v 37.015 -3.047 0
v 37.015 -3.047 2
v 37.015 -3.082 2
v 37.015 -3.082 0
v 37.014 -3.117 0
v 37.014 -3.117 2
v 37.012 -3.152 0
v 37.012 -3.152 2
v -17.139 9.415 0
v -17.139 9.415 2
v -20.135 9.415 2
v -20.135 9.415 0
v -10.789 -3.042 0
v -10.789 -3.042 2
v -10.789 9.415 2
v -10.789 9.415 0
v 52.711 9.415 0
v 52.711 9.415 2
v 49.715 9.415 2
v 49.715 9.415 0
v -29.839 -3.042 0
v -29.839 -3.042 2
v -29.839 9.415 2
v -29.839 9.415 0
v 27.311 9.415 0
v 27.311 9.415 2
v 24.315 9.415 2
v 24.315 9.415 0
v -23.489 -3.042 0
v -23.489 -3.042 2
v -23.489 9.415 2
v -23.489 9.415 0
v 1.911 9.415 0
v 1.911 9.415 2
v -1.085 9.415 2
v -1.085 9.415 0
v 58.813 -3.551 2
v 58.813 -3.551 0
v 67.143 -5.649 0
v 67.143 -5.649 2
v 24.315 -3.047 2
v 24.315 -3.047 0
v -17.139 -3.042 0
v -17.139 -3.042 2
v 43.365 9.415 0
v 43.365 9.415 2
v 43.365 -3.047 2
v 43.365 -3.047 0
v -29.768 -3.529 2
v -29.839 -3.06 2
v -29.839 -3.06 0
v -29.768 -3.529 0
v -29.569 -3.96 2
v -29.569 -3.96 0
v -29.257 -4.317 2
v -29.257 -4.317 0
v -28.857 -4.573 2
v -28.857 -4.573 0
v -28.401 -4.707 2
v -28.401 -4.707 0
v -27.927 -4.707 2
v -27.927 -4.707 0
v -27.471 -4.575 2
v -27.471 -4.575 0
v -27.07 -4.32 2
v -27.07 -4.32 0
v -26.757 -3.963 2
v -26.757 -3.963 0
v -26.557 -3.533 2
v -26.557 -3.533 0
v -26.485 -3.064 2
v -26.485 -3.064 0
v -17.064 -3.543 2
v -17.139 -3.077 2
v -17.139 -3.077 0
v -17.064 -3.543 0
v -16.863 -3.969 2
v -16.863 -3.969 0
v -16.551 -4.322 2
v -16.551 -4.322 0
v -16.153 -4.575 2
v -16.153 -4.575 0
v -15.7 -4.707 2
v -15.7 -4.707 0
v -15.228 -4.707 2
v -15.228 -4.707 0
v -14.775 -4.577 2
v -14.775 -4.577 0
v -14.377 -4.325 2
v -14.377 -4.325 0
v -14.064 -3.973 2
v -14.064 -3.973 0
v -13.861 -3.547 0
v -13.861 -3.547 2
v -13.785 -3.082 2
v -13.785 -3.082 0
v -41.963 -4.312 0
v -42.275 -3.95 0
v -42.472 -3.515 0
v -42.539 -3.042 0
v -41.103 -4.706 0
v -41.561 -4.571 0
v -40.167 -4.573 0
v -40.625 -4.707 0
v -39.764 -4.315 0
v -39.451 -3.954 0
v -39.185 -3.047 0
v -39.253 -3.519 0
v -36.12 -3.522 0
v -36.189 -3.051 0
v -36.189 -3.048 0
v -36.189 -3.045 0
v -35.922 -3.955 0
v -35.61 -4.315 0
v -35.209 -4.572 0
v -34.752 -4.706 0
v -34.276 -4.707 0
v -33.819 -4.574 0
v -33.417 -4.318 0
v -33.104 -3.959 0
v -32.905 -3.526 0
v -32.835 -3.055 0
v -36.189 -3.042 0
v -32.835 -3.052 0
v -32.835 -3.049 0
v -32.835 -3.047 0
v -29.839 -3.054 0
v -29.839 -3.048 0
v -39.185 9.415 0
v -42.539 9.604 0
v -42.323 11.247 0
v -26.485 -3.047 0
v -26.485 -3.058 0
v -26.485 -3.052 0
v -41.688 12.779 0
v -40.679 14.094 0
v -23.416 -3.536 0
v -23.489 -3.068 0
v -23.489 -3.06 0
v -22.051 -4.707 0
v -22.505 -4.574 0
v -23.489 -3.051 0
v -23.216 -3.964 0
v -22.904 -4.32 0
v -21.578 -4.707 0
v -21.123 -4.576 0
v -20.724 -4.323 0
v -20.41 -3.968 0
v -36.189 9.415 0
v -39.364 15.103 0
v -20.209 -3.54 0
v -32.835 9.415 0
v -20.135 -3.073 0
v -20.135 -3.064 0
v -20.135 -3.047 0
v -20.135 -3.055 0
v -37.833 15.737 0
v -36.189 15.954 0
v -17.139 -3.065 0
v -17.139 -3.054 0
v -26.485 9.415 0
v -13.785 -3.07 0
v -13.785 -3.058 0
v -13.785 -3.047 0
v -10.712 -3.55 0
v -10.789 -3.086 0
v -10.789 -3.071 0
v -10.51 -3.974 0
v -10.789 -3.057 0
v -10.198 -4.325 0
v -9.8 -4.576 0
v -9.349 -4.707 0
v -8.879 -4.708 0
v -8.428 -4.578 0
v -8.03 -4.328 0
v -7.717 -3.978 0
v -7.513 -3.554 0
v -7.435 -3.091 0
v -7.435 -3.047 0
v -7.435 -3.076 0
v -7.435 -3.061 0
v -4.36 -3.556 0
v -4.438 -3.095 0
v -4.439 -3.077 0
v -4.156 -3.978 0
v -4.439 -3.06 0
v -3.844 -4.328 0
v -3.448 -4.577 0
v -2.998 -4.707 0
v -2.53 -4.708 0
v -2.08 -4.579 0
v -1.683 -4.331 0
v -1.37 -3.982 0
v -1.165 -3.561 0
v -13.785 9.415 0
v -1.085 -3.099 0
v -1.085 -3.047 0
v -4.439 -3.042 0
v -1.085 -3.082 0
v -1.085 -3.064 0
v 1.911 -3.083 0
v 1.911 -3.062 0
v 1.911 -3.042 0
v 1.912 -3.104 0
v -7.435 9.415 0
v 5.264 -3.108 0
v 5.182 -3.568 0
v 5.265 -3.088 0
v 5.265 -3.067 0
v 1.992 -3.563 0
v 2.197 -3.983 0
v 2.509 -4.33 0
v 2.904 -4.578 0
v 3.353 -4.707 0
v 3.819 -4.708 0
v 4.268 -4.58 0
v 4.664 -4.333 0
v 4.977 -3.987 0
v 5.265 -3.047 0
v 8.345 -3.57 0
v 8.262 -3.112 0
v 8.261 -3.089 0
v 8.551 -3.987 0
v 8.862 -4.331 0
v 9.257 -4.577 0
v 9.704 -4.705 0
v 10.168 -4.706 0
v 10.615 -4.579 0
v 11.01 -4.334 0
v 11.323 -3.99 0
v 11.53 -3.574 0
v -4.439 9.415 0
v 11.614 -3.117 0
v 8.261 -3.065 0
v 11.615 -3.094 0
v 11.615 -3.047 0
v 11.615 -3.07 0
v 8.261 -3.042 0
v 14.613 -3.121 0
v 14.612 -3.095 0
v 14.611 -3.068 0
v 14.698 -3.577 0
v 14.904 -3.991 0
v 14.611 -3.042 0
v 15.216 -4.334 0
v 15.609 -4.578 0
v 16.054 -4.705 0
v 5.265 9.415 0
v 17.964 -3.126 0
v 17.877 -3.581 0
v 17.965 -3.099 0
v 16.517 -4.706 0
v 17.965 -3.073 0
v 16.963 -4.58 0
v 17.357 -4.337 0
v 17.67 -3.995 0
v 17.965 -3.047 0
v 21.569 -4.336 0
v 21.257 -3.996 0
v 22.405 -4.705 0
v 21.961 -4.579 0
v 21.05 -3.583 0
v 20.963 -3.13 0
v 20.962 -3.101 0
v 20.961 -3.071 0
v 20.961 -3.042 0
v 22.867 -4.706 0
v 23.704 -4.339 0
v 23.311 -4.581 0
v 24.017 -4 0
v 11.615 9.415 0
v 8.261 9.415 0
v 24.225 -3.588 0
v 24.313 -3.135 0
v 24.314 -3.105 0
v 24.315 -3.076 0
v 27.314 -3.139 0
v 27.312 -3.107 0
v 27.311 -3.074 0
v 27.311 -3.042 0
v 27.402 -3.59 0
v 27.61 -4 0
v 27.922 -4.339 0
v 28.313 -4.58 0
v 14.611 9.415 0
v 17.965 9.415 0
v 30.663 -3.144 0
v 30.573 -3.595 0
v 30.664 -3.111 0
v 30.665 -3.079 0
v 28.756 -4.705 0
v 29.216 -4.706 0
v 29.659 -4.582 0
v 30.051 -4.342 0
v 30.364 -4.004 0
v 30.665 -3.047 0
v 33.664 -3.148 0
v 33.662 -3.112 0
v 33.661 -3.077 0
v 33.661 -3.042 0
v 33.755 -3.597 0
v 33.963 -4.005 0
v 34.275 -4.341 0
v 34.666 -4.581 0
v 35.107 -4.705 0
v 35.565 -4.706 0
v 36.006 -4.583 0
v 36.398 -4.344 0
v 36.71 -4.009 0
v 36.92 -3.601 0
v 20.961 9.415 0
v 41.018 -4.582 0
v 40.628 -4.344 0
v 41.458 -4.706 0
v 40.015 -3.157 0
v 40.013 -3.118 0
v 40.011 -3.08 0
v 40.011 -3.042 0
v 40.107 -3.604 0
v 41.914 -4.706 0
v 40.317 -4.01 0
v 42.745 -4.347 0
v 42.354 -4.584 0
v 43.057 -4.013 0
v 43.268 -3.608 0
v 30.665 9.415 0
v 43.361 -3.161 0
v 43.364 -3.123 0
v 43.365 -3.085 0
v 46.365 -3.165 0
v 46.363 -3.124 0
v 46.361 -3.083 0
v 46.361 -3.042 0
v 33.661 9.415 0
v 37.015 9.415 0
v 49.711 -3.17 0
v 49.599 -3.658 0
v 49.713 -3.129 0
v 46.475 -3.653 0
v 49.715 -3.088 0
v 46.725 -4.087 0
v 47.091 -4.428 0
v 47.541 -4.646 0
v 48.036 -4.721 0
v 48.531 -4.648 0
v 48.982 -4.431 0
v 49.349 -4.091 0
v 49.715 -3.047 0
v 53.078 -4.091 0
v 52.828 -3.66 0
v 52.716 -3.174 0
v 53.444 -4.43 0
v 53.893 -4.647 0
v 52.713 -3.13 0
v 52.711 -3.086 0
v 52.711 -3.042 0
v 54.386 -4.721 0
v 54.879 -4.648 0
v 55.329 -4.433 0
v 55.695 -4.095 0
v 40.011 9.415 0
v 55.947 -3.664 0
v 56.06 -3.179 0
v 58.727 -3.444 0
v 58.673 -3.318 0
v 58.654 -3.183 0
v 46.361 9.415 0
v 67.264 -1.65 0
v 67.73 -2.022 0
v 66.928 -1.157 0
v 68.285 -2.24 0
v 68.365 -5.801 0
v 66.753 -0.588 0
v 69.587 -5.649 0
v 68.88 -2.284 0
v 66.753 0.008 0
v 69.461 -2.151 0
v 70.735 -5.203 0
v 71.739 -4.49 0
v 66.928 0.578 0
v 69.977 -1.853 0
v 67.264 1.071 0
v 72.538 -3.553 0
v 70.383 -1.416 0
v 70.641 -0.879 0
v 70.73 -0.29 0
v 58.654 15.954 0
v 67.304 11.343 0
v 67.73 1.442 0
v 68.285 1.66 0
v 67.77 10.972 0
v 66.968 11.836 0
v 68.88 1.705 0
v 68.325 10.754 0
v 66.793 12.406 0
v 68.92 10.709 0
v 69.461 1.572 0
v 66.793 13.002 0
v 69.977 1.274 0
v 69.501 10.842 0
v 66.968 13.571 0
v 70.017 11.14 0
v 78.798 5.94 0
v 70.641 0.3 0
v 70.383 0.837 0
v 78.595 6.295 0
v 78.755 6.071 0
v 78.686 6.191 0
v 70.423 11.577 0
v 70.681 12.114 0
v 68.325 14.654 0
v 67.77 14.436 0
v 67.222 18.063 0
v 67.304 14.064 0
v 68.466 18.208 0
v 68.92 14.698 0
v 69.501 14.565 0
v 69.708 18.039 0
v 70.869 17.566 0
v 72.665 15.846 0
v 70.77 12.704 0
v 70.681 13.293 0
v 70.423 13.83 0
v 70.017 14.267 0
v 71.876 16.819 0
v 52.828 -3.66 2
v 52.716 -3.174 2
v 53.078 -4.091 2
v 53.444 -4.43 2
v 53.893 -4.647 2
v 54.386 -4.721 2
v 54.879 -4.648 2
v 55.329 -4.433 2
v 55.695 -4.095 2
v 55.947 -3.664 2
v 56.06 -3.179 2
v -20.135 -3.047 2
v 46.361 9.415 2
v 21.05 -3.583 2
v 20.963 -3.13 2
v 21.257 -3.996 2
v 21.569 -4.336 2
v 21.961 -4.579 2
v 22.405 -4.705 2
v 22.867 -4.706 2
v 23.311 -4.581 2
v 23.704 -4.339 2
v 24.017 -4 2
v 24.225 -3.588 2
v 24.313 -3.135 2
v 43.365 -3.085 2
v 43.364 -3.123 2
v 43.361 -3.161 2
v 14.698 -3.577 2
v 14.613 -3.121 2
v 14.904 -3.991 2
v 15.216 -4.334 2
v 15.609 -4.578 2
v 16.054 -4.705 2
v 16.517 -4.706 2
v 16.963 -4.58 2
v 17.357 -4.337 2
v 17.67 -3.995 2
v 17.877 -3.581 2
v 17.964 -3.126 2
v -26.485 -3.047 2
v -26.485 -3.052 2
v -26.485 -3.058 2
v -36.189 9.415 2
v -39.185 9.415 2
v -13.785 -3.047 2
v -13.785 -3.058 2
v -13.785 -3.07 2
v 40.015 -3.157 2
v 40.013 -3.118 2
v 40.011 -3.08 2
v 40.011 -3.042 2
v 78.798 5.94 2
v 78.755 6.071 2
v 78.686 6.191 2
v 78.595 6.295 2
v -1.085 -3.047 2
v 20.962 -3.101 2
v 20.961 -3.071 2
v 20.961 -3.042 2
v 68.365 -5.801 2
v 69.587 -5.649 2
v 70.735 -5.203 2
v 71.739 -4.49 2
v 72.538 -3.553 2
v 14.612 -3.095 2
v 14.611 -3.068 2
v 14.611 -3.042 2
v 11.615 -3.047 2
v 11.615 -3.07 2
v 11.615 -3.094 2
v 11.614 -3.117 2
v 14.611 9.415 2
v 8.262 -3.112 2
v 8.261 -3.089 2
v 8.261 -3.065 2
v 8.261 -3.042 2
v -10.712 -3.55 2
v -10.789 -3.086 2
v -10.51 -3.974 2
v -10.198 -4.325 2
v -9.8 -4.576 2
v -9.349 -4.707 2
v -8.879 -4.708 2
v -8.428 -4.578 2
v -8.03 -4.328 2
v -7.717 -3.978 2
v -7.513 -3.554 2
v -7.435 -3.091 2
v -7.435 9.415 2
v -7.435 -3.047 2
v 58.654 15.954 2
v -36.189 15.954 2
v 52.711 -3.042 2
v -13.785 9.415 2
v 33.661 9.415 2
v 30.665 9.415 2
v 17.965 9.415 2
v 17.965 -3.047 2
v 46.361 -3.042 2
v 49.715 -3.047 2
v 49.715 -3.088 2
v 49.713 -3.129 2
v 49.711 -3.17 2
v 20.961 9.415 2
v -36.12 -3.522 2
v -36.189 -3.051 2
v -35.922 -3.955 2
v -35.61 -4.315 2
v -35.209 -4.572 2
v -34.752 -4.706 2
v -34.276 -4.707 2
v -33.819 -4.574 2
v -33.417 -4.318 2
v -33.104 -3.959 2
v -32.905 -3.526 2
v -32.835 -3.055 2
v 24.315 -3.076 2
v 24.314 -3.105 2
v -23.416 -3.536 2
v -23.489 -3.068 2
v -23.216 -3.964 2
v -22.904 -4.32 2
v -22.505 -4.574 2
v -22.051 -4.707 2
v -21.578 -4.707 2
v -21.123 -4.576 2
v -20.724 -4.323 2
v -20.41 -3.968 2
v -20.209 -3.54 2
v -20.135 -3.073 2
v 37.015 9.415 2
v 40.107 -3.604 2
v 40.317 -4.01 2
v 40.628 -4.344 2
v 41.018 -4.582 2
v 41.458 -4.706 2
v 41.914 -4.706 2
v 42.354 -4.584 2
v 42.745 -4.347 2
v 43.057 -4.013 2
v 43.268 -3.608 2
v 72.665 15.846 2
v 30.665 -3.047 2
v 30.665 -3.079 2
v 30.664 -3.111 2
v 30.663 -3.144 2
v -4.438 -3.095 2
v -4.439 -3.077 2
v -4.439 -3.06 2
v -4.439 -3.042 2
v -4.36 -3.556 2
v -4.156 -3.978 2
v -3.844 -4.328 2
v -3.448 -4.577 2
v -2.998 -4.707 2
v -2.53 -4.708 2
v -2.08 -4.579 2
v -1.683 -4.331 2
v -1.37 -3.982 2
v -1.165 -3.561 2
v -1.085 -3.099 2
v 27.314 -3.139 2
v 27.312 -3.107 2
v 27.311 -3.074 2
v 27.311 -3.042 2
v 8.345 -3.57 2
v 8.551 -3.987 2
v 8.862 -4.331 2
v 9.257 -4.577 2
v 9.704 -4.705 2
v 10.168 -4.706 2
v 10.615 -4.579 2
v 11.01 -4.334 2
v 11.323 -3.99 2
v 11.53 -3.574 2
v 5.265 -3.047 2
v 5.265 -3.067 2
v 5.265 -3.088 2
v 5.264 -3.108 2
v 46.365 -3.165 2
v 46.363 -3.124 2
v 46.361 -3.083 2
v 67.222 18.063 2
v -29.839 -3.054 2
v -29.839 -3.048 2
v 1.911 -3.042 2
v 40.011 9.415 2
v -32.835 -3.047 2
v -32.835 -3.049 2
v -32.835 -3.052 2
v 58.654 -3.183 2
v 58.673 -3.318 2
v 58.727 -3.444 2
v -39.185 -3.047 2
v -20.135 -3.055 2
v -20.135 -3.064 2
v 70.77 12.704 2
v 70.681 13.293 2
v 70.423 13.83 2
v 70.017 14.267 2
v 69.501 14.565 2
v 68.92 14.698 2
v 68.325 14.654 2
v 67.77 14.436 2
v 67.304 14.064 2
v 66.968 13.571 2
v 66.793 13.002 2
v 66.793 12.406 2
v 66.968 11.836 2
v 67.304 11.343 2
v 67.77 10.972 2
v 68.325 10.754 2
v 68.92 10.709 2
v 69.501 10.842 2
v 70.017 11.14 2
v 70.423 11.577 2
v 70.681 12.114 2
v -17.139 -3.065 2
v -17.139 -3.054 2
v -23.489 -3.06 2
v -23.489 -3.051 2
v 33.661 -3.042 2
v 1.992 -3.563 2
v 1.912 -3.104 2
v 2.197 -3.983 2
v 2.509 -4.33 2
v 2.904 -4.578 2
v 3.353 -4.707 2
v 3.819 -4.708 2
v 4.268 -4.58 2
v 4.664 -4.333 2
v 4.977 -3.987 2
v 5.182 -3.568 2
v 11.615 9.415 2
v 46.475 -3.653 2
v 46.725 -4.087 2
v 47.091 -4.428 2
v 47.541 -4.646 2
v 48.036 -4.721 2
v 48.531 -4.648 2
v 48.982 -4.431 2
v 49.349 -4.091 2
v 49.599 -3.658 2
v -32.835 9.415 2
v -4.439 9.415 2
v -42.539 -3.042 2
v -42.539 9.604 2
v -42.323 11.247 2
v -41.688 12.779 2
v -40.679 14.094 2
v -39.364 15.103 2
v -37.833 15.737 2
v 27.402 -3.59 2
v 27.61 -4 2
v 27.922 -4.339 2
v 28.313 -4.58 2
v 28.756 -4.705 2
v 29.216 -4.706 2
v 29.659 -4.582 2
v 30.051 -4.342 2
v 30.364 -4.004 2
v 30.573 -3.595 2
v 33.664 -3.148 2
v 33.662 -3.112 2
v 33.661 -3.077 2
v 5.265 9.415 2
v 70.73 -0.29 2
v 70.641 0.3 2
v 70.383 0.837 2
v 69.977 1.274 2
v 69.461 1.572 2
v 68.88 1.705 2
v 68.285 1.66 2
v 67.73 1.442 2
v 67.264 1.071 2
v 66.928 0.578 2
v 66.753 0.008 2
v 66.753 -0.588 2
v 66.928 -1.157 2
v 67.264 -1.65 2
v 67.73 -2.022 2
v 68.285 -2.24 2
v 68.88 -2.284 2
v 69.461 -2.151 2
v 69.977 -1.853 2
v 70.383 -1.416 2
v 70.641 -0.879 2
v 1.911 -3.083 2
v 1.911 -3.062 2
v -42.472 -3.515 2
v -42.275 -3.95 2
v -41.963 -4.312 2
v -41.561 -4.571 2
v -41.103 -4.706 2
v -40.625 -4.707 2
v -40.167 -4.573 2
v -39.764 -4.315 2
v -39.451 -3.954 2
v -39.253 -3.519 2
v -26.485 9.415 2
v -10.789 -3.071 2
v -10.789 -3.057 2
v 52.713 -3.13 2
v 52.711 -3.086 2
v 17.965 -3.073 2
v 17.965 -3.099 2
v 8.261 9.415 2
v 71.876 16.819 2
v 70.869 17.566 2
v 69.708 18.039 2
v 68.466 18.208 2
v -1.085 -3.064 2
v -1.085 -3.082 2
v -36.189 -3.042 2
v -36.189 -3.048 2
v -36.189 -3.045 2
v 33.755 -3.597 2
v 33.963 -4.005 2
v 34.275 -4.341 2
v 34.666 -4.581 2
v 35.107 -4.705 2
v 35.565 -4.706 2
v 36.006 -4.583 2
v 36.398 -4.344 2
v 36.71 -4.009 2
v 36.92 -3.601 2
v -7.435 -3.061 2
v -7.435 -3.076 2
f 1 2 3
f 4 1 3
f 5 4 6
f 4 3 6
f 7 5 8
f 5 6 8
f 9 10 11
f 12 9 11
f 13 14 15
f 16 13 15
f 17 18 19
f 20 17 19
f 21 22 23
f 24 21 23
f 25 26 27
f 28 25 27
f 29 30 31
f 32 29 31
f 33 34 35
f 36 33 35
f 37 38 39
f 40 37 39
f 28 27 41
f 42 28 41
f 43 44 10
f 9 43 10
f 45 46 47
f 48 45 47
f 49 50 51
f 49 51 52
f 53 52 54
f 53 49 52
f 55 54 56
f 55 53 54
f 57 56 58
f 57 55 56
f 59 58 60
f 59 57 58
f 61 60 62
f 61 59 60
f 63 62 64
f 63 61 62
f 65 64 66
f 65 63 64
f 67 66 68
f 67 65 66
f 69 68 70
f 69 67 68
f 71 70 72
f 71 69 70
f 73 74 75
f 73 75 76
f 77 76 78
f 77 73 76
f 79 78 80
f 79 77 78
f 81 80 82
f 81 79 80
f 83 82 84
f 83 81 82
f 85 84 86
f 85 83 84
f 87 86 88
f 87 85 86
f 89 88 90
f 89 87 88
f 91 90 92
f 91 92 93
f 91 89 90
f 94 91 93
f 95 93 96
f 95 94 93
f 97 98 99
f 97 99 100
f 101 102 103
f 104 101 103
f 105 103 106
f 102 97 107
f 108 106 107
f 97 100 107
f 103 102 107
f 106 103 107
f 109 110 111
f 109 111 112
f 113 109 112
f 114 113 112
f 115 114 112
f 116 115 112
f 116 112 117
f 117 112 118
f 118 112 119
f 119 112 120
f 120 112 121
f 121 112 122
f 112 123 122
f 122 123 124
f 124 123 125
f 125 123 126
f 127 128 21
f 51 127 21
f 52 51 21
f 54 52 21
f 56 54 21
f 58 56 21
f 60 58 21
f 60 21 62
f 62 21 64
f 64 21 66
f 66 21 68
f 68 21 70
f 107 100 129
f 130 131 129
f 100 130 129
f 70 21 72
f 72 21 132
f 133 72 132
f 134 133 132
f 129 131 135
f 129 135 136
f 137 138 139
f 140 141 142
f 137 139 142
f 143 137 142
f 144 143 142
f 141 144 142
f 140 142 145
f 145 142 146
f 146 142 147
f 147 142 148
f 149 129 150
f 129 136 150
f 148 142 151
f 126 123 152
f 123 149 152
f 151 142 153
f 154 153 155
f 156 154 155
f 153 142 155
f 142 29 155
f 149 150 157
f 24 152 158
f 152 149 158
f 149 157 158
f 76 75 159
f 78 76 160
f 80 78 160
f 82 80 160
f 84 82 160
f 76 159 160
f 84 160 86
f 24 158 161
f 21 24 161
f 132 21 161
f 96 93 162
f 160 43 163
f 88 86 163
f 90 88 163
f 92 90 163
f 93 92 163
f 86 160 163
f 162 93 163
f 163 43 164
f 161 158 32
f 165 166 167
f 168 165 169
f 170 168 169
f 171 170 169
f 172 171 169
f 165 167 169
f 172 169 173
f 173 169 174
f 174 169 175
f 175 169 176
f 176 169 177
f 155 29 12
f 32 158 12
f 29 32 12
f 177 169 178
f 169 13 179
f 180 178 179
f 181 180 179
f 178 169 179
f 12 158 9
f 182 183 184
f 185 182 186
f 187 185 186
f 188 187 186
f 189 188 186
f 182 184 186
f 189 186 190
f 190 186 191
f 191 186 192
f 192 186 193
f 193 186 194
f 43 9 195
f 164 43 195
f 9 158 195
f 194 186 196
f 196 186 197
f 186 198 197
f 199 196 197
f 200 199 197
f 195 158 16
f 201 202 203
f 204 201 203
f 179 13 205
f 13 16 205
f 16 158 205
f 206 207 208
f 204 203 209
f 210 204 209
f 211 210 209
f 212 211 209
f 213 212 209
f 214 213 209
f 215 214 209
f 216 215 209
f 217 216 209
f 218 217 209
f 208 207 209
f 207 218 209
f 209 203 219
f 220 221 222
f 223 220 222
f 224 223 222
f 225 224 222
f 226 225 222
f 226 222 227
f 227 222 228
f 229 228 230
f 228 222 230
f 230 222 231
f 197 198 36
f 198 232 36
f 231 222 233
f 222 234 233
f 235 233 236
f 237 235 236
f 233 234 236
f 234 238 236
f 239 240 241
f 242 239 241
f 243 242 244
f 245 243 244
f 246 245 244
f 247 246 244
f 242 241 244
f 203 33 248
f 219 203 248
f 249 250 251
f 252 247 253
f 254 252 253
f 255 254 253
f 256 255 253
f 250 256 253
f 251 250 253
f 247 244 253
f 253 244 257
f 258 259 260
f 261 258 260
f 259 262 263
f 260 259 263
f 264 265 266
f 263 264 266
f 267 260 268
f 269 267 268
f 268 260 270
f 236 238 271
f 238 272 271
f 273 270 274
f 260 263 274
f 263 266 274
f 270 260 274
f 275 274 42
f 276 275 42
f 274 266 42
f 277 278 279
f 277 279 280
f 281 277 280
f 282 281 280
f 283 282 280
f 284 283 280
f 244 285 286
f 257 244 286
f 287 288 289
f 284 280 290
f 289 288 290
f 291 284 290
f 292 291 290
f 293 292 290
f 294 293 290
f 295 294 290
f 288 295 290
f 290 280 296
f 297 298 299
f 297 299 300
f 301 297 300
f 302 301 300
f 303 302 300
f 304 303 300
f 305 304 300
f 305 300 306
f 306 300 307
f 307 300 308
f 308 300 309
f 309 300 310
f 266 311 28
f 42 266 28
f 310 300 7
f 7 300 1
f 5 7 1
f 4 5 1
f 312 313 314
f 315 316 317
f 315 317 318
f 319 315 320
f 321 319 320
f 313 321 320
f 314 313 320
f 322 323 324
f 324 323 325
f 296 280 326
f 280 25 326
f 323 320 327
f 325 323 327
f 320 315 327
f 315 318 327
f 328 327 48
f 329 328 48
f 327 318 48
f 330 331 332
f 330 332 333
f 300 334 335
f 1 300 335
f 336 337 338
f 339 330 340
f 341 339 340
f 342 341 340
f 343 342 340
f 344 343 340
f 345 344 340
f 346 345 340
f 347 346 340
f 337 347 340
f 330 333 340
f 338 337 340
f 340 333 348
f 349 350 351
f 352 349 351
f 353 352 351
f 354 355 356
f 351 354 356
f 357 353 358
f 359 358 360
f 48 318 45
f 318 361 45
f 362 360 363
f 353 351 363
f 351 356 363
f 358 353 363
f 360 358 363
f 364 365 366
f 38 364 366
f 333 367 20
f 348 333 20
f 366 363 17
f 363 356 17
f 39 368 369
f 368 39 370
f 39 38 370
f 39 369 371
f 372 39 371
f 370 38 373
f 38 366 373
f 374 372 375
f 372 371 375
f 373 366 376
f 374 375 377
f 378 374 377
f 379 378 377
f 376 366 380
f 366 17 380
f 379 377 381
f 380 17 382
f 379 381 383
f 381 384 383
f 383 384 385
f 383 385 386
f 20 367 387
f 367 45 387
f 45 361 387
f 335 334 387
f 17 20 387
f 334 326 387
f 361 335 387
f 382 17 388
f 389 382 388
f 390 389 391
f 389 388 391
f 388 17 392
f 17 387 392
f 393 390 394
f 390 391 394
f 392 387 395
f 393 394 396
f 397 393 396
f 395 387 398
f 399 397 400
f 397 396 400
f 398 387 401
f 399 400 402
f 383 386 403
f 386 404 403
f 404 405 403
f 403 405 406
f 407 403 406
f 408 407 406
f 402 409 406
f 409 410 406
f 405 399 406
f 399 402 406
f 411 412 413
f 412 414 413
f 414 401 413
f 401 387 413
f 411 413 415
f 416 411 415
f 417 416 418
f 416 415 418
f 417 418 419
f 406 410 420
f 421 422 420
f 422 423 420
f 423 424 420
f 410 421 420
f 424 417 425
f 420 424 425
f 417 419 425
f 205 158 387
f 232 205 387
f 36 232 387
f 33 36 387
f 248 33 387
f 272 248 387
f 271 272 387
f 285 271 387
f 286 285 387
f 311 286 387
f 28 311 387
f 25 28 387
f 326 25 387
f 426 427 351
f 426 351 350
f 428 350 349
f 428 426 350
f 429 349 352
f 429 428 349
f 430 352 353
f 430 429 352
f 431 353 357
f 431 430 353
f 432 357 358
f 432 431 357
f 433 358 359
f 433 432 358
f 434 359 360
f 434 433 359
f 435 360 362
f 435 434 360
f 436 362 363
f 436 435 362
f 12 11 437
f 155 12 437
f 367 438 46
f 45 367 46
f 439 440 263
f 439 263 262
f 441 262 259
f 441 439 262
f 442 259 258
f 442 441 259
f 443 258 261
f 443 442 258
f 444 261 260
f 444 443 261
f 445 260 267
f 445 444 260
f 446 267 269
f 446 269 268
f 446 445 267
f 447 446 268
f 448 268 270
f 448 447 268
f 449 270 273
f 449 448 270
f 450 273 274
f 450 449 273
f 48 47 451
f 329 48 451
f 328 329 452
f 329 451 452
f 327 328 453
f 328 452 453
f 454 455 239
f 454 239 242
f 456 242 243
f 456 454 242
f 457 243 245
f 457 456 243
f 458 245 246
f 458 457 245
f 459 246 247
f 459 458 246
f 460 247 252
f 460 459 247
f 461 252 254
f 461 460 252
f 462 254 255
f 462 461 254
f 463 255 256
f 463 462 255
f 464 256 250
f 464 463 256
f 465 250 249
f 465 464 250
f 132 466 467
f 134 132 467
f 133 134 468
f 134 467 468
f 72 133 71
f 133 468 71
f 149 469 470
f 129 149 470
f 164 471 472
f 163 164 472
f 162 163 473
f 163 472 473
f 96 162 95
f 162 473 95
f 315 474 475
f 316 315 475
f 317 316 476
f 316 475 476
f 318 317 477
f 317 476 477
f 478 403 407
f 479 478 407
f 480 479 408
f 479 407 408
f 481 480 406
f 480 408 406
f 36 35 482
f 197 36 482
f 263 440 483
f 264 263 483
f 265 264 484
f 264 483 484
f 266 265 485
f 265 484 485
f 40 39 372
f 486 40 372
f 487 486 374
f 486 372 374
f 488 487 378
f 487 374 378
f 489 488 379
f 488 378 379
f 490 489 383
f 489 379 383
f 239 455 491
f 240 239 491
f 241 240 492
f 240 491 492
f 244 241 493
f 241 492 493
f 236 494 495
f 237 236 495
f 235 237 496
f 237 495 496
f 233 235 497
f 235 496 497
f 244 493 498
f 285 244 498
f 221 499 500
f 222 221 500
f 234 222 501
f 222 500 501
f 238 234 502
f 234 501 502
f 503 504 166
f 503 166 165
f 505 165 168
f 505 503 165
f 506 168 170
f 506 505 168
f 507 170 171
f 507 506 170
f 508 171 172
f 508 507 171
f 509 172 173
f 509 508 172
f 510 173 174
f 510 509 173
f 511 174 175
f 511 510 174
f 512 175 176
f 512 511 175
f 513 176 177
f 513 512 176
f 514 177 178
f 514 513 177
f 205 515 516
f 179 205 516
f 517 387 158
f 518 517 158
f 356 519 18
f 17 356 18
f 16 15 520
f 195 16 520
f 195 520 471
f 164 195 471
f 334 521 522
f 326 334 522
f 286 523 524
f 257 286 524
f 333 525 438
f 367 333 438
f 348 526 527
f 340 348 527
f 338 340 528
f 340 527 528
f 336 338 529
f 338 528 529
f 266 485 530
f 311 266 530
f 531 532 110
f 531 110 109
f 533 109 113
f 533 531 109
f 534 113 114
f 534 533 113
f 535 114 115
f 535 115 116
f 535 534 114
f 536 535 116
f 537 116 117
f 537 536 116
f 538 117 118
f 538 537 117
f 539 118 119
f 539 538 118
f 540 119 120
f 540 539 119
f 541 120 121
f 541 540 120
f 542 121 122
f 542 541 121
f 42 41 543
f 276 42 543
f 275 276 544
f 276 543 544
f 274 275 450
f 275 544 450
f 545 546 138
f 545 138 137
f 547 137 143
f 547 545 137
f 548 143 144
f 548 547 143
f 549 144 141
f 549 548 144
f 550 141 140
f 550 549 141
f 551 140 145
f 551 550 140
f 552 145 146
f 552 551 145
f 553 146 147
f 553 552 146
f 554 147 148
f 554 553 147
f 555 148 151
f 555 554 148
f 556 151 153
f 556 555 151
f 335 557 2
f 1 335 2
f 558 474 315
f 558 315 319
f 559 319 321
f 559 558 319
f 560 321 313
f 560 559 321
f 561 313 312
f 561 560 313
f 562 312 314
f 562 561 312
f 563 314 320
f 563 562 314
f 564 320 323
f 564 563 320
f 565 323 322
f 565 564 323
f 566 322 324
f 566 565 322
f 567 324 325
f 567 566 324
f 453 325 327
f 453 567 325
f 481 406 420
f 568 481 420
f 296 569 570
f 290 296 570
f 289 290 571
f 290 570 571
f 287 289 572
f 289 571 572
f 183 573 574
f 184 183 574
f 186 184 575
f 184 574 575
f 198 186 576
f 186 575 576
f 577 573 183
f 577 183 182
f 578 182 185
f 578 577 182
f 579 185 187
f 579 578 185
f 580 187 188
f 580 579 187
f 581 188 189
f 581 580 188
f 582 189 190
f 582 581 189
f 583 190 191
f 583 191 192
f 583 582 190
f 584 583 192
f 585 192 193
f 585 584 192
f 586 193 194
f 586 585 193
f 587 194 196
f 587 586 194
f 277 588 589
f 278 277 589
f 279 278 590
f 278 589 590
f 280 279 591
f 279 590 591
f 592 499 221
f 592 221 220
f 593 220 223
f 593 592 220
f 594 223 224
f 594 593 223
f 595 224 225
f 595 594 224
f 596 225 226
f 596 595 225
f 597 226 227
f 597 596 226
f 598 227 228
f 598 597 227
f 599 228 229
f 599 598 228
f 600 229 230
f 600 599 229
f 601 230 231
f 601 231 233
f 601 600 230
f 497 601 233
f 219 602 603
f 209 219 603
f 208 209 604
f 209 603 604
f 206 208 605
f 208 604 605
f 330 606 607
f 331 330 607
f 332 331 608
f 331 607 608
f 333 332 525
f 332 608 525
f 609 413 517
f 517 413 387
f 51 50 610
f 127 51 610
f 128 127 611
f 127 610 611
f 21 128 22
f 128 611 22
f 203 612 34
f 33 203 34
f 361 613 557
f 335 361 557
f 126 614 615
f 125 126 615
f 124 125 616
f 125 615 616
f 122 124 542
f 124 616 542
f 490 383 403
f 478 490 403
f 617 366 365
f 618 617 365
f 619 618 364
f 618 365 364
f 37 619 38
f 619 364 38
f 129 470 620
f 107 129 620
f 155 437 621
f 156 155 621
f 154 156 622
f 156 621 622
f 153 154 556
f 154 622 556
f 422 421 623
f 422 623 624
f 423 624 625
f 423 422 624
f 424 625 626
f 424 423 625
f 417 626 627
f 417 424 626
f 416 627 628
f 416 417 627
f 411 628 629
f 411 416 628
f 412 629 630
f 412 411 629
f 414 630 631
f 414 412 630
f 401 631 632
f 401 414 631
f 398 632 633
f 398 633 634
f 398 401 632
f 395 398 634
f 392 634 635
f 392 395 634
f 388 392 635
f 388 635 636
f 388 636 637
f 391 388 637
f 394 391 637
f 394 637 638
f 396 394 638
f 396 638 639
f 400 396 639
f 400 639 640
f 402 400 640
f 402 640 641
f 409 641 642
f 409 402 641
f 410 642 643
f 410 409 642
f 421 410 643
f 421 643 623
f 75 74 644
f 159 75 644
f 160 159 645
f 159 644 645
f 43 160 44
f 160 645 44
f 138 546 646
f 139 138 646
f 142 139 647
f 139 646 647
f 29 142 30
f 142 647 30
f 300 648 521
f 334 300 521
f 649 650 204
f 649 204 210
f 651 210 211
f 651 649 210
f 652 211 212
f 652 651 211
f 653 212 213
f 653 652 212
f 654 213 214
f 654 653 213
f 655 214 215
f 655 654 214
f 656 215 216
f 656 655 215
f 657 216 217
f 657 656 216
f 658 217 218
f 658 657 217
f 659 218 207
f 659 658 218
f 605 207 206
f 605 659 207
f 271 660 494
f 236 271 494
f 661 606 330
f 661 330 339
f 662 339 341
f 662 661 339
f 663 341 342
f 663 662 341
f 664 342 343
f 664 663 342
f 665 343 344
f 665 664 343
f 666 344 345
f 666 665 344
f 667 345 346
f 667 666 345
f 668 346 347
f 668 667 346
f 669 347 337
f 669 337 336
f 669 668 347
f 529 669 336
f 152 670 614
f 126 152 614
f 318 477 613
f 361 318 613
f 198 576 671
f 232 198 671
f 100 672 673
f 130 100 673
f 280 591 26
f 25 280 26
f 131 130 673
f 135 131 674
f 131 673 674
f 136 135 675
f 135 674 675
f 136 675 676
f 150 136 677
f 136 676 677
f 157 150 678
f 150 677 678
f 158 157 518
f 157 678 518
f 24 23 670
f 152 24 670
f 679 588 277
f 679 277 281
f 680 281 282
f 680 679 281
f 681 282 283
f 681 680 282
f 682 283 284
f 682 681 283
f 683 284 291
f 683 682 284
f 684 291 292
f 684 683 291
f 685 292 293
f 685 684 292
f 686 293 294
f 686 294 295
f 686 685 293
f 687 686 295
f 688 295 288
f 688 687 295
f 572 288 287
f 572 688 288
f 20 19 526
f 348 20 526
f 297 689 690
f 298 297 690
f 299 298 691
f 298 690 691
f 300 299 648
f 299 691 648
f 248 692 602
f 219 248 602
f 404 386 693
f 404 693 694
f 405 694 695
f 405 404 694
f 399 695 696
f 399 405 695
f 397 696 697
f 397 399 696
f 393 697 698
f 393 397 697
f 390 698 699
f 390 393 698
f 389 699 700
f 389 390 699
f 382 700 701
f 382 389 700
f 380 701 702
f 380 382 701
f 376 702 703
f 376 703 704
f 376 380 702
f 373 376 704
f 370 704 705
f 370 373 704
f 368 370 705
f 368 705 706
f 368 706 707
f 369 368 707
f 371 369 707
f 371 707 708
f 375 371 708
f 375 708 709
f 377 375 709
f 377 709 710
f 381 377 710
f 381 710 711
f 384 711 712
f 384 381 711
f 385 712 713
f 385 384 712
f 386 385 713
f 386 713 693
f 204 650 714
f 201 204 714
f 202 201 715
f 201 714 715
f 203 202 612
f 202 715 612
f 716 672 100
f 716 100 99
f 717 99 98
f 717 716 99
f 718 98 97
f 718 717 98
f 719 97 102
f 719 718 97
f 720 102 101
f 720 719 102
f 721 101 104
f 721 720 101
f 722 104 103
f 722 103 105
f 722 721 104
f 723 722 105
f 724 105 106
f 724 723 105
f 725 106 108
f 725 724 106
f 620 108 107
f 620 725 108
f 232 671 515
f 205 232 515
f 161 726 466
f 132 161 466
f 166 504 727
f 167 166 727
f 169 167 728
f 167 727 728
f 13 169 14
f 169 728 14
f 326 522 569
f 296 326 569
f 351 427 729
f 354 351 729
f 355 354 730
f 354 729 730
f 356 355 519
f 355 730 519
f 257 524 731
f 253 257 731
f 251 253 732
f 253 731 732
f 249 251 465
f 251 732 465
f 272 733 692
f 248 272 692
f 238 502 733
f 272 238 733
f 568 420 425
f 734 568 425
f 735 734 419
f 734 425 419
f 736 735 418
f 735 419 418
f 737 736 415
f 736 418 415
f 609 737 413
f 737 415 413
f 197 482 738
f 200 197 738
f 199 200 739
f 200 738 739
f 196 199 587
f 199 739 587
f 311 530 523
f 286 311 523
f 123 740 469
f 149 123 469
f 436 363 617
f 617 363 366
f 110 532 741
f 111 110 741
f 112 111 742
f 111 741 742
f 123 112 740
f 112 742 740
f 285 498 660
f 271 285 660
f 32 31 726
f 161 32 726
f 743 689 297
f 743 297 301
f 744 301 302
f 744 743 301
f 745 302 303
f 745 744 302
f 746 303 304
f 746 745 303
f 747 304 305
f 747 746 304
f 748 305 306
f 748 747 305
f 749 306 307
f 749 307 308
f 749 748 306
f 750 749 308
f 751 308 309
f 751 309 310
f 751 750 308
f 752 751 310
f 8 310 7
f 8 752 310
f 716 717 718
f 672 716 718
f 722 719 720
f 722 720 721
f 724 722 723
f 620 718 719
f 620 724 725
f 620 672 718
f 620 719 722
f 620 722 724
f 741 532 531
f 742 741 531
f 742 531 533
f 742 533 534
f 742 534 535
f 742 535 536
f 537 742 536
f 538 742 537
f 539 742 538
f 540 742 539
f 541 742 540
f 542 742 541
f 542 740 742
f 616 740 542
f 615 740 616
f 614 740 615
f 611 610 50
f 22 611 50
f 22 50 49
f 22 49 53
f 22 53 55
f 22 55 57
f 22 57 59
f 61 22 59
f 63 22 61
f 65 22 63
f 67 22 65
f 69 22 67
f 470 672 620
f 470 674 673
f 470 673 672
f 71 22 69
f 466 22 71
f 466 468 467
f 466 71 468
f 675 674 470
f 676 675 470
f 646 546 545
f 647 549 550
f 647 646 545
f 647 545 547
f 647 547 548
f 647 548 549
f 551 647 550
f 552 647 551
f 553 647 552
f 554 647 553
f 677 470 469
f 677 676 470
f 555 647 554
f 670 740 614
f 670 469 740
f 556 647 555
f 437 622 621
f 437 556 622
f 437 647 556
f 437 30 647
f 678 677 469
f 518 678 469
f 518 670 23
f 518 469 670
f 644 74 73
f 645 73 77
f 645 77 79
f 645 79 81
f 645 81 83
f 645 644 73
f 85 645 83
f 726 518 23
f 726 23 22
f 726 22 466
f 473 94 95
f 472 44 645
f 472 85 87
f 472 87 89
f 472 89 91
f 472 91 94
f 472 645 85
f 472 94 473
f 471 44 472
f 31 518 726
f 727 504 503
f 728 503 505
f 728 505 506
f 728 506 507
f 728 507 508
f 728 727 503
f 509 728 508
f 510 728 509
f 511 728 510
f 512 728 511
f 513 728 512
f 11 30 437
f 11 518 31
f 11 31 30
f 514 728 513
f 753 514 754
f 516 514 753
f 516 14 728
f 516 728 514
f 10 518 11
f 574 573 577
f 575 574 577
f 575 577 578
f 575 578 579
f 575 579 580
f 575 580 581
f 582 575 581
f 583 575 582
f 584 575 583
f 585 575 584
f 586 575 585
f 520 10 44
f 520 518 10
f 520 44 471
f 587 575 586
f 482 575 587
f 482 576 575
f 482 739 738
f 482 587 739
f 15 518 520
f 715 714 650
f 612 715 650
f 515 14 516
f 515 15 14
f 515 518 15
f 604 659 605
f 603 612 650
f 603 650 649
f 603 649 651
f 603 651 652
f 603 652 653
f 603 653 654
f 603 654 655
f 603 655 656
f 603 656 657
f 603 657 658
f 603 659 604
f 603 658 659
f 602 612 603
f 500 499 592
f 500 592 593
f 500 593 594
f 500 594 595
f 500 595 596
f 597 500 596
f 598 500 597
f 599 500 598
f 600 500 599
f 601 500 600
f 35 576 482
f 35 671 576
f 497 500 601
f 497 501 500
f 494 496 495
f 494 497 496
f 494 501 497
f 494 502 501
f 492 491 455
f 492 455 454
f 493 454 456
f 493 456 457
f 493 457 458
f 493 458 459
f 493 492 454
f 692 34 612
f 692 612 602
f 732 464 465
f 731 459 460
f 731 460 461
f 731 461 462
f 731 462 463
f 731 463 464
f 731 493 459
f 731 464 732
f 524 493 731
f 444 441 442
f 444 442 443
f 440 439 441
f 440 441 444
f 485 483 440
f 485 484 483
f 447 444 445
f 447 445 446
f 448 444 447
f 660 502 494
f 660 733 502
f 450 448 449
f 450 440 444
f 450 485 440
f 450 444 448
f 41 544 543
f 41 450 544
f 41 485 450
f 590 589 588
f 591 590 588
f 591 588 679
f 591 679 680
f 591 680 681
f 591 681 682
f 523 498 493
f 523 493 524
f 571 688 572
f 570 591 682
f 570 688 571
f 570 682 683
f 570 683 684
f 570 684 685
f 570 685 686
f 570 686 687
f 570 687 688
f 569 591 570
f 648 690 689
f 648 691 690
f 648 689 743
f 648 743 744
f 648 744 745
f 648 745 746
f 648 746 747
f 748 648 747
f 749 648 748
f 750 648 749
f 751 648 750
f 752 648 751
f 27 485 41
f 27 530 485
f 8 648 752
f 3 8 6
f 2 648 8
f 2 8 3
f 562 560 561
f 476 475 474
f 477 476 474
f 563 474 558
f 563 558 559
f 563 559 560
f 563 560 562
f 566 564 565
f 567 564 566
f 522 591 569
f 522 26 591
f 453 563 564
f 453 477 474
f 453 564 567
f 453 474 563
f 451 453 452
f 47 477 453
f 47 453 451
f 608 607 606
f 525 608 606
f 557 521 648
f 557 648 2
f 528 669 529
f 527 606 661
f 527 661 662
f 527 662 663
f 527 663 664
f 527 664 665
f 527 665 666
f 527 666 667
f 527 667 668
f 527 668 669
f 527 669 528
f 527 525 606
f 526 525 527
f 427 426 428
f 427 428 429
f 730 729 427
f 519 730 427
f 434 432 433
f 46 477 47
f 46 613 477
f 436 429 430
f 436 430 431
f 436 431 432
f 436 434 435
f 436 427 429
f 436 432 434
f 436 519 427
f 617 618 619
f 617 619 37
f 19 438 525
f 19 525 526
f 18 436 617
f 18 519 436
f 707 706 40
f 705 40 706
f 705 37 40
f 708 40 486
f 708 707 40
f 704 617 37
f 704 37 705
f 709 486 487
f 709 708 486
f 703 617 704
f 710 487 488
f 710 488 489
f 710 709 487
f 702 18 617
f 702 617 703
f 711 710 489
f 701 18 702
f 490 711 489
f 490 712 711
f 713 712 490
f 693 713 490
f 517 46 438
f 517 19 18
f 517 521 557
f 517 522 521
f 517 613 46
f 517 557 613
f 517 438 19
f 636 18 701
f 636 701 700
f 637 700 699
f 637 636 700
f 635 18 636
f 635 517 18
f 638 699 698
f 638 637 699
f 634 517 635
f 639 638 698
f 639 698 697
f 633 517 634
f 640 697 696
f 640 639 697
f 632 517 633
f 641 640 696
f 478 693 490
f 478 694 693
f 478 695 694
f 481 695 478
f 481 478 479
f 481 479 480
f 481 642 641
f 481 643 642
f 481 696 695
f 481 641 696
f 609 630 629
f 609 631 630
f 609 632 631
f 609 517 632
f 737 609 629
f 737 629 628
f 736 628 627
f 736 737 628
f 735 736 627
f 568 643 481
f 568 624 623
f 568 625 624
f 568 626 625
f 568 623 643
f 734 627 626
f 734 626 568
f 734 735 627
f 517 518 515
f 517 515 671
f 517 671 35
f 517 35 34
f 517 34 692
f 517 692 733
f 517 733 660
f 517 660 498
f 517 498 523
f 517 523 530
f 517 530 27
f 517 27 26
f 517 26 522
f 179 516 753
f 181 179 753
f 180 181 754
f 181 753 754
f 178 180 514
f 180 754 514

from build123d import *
from build123d import SkipClean  # not in build123d's __all__

# Parameters (mm, degrees)
F0_R     = 2
F1_DEPTH = 2
F3_DEPTH = 25.4
F4_DEPTH = 2
F5_DEPTH = 25.4


# Not quite as in the source:
# - a feature names something its author has since deleted; it is built from what else it names


with BuildPart() as f1:
    # F0 (on Top) → F1 (new body)
    with BuildSketch(Plane.XY):
        with BuildLine():
            ThreePointArc((-44.4982377637, 15.9537835574), (-46.6435438514, 15.0651686804), (-47.5321587284, 12.9198625927))
            Line((-47.5321587284, 12.9198625927), (-47.5321587284, 1.9581455603))
            ThreePointArc((-47.5321587284, 1.9581455603), (-46.0701489095, -1.5749303628), (-42.539108537, -3.0418496097))
            Line((-42.539108537, -3.0418496097), (58.6544047029, -3.182504855))
            ThreePointArc((58.6544047029, -3.182504855), (58.695576092, -3.383063352), (58.8128977225, -3.5508561677))
            Line((58.8128977225, -3.5508561677), (67.1425286707, -5.6492492557))
            ThreePointArc((67.1425286707, -5.6492492557), (70.1745553832, -5.4613941054), (72.5382215144, -3.553107449))
            Line((72.5382215144, -3.553107449), (78.7976136626, 5.9399087982))
            ThreePointArc((78.7976136626, 5.9399087982), (78.7234830832, 6.1327797263), (78.5951017421, 6.2946833056))
            Line((78.5951017421, 6.2946833056), (72.6648820615, 15.8458770867))
            ThreePointArc((72.6648820615, 15.8458770867), (70.3034587252, 17.8389512741), (67.2215312081, 18.0634232527))
            Line((67.2215312081, 18.0634232527), (58.6544042144, 15.9537835574))
            Line((58.6544042144, 15.9537835574), (-44.4982377637, 15.9537835574))
        make_face()
        with Locations((68.7303330245, -0.2896678891)):
            Circle(F0_R, mode=Mode.SUBTRACT)
        with Locations((68.7701961271, 12.7037232041)):
            Circle(F0_R, mode=Mode.SUBTRACT)
    extrude(amount=F1_DEPTH)

    # F2 (on face) → F3 (cut)
    with BuildSketch(Plane.XY.offset(2)):
        with BuildLine():
            Line((-10.789108537, 9.4149718061), (-13.784505137, 9.4149718061))
            Line((-13.784505137, 9.4149718061), (-13.784505137, -3.0465123845))
            ThreePointArc((-13.784505137, -3.0465123845), (-13.7845980378, -3.0641656349), (-13.7848767298, -3.0818169297))
            Line((-13.7848767298, -3.0818169297), (-10.7886505729, -3.0859815734))
            ThreePointArc((-10.7886505729, -3.0859815734), (-10.7890247148, -3.0639170979), (-10.789108537, -3.0418496097))
            Line((-10.789108537, -3.0418496097), (-10.789108537, 9.4149718061))
        make_face()
        with BuildLine():
            Line((-4.439108537, 9.4149718061), (-7.434505137, 9.4149718061))
            Line((-7.434505137, 9.4149718061), (-7.434505137, -3.0465123845))
            ThreePointArc((-7.434505137, -3.0465123845), (-7.4346503047, -3.0685795544), (-7.4350857828, -3.0906429046))
            Line((-7.4350857828, -3.0906429046), (-4.4384195675, -3.0948081599))
            ThreePointArc((-4.4384195675, -3.0948081599), (-4.4389730944, -3.0683316044), (-4.439108537, -3.0418496097))
            Line((-4.439108537, -3.0418496097), (-4.439108537, 9.4149718061))
        make_face()
        with BuildLine():
            Line((1.910891463, 9.4149718061), (-1.084505137, 9.4149718061))
            Line((-1.084505137, 9.4149718061), (-1.084505137, -3.0465123845))
            ThreePointArc((-1.084505137, -3.0465123845), (-1.0847141969, -3.0729939003), (-1.0853413245, -3.0994688148))
            Line((-1.0853413245, -3.0994688148), (1.911857947, -3.1036348111))
            ThreePointArc((1.911857947, -3.1036348111), (1.9110901561, -3.0727466615), (1.910891463, -3.0418496097))
            Line((1.910891463, -3.0418496097), (1.910891463, 9.4149718061))
        make_face()
        with BuildLine():
            Line((8.260891463, 9.4149718061), (5.265494863, 9.4149718061))
            Line((5.265494863, 9.4149718061), (5.265494863, -3.0465123845))
            ThreePointArc((5.265494863, -3.0465123845), (5.2652102793, -3.0774087645), (5.2643566248, -3.1082946604))
            Line((5.2643566248, -3.1082946604), (8.2622802241, -3.1124616635))
            ThreePointArc((8.2622802241, -3.1124616635), (8.2612141473, -3.0771629469), (8.260891463, -3.0418496097))
            Line((8.260891463, -3.0418496097), (8.260891463, 9.4149718061))
        make_face()
        with BuildLine():
            Line((14.610891463, 9.4149718061), (11.615494863, 9.4149718061))
            Line((11.615494863, 9.4149718061), (11.615494863, -3.0465123845))
            ThreePointArc((11.615494863, -3.0465123845), (11.6150740117, -3.0818246882), (11.6139098113, -3.1171203048))
            Line((11.6139098113, -3.1171203048), (14.6126631372, -3.1212884611))
            ThreePointArc((14.6126631372, -3.1212884611), (14.6113068287, -3.081579528), (14.610891463, -3.0418496097))
            Line((14.610891463, -3.0418496097), (14.610891463, 9.4149718061))
        make_face()
        with BuildLine():
            Line((17.9635023619, -3.1259460039), (20.9630926527, -3.1301153236))
            ThreePointArc((20.9630926527, -3.1301153236), (20.9614111694, -3.0859969529), (20.960891463, -3.0418496097))
            Line((20.960891463, -3.0418496097), (20.960891463, 9.4149718061))
            Line((20.960891463, 9.4149718061), (17.965494863, 9.4149718061))
            Line((17.965494863, 9.4149718061), (17.965494863, -3.0465123845))
            ThreePointArc((17.965494863, -3.0465123845), (17.9649690528, -3.0862409946), (17.9635023619, -3.1259460039))
        make_face()
        with BuildLine():
            Line((24.3130483101, -3.1347716382), (27.3135688072, -3.1389422508))
            ThreePointArc((27.3135688072, -3.1389422508), (27.3115271807, -3.0904153143), (27.310891463, -3.0418496097))
            Line((27.310891463, -3.0418496097), (27.310891463, 9.4149718061))
            Line((27.310891463, 9.4149718061), (24.315494863, 9.4149718061))
            Line((24.315494863, 9.4149718061), (24.315494863, -3.0465123845))
            ThreePointArc((24.315494863, -3.0465123845), (24.3148524325, -3.0906581124), (24.3130483101, -3.1347716382))
        make_face()
        with BuildLine():
            Line((30.6625476193, -3.1435972077), (33.6640916417, -3.147769243))
            ThreePointArc((33.6640916417, -3.147769243), (33.6616548753, -3.0948347051), (33.660891463, -3.0418496097))
            Line((33.660891463, -3.0418496097), (33.660891463, 9.4149718061))
            Line((33.660891463, 9.4149718061), (30.665494863, 9.4149718061))
            Line((30.665494863, 9.4149718061), (30.665494863, -3.0465123845))
            ThreePointArc((30.665494863, -3.0465123845), (30.6647241389, -3.0950761342), (30.6625476193, -3.1435972077))
        make_face()
        with BuildLine():
            Line((37.0120002484, -3.1524227123), (40.014661201, -3.1565963001))
            ThreePointArc((40.014661201, -3.1565963001), (40.011794267, -3.0992552184), (40.010891463, -3.0418496097))
            Line((40.010891463, -3.0418496097), (40.010891463, 9.4149718061))
            Line((40.010891463, 9.4149718061), (37.015494863, 9.4149718061))
            Line((37.015494863, 9.4149718061), (37.015494863, -3.0465123845))
            ThreePointArc((37.015494863, -3.0465123845), (37.0145841593, -3.0994951529), (37.0120002484, -3.1524227123))
        make_face()
        with BuildLine():
            Line((43.3614061528, -3.1612481519), (46.3652775338, -3.1654234222))
            ThreePointArc((46.3652775338, -3.1654234222), (46.361945371, -3.1036769476), (46.360891463, -3.0418496097))
            Line((46.360891463, -3.0418496097), (46.360891463, 9.4149718061))
            Line((46.360891463, 9.4149718061), (43.365494863, 9.4149718061))
            Line((43.365494863, 9.4149718061), (43.365494863, -3.0465123845))
            ThreePointArc((43.365494863, -3.0465123845), (43.3644324794, -3.1039152616), (43.3614061528, -3.1612481519))
        make_face()
        with BuildLine():
            Line((49.7107652838, -3.1700735266), (52.7159406928, -3.1742506094))
            ThreePointArc((52.7159406928, -3.1742506094), (52.7121082036, -3.1080999865), (52.710891463, -3.0418496097))
            Line((52.710891463, -3.0418496097), (52.710891463, 9.4149718061))
            Line((52.710891463, 9.4149718061), (49.715494863, 9.4149718061))
            Line((49.715494863, 9.4149718061), (49.715494863, -3.0465123845))
            ThreePointArc((49.715494863, -3.0465123845), (49.7142690839, -3.1083365537), (49.7107652838, -3.1700735266))
        make_face()
        with BuildLine():
            Line((-17.139108537, 9.4149718061), (-20.134505137, 9.4149718061))
            Line((-20.134505137, 9.4149718061), (-20.134505137, -3.0465123845))
            ThreePointArc((-20.134505137, -3.0465123845), (-20.1345573909, -3.0597520498), (-20.1347141494, -3.0729908903))
            Line((-20.1347141494, -3.0729908903), (-17.1388350895, -3.0771550515))
            ThreePointArc((-17.1388350895, -3.0771550515), (-17.1390647112, -3.0595030501), (-17.139108537, -3.0418496097))
            Line((-17.139108537, -3.0418496097), (-17.139108537, 9.4149718061))
        make_face()
        with BuildLine():
            Line((-23.489108537, 9.4149718061), (-26.484505137, 9.4149718061))
            Line((-26.484505137, 9.4149718061), (-26.484505137, -3.0465123845))
            ThreePointArc((-26.484505137, -3.0465123845), (-26.4845283601, -3.0553387076), (-26.4845980289, -3.0641647862))
            Line((-26.4845980289, -3.0641647862), (-23.4889731336, -3.0683285942))
            ThreePointArc((-23.4889731336, -3.0683285942), (-23.4890930885, -3.0550893691), (-23.489108537, -3.0418496097))
            Line((-23.489108537, -3.0418496097), (-23.489108537, 9.4149718061))
        make_face()
        with BuildLine():
            Line((-29.839108537, 9.4149718061), (-32.834505137, 9.4149718061))
            Line((-32.834505137, 9.4149718061), (-32.834505137, -3.0465123845))
            ThreePointArc((-32.834505137, -3.0465123845), (-32.8345109427, -3.0509255163), (-32.8345283597, -3.0553386176))
            Line((-32.8345283597, -3.0553386176), (-29.8390647178, -3.0595022015))
            ThreePointArc((-29.8390647178, -3.0595022015), (-29.8391098505, -3.0506759632), (-29.839108537, -3.0418496097))
            Line((-29.839108537, -3.0418496097), (-29.839108537, 9.4149718061))
        make_face()
        with BuildLine():
            Line((-36.189108537, 9.4149718061), (-39.184505137, 9.4149718061))
            Line((-39.184505137, 9.4149718061), (-39.184505137, -3.0465123845))
            Line((-39.184505137, -3.0465123845), (-36.1891098507, -3.0506758733))
            ThreePointArc((-36.1891098507, -3.0506758733), (-36.1891149995, -3.0462627406), (-36.189108537, -3.0418496097))
            Line((-36.189108537, -3.0418496097), (-36.189108537, 9.4149718061))
        make_face()
    extrude(amount=-F3_DEPTH, mode=Mode.SUBTRACT)

    # F2 (on face) → F4 (join)
    with BuildSketch(Plane.XY.offset(2)):
        with BuildLine():
            ThreePointArc((52.7159406928, -3.1742506094), (54.3858617756, -4.7214826971), (56.0600775884, -3.1788988362))
            Line((56.0600775884, -3.1788988362), (52.7159406928, -3.1742506094))
        make_face()
        with BuildLine():
            ThreePointArc((46.3652775338, -3.1654234222), (48.0358617756, -4.7214826971), (49.7107652838, -3.1700735266))
            Line((49.7107652838, -3.1700735266), (46.3652775338, -3.1654234222))
        make_face()
        with BuildLine():
            ThreePointArc((40.014661201, -3.1565963001), (41.6858617756, -4.7214826971), (43.3614061528, -3.1612481519))
            Line((43.3614061528, -3.1612481519), (40.014661201, -3.1565963001))
        make_face()
        with BuildLine():
            ThreePointArc((33.6640916417, -3.147769243), (35.3358617756, -4.7214826971), (37.0120002484, -3.1524227123))
            Line((37.0120002484, -3.1524227123), (33.6640916417, -3.147769243))
        make_face()
        with BuildLine():
            ThreePointArc((27.3135688072, -3.1389422508), (28.9858617756, -4.7214826971), (30.6625476193, -3.1435972077))
            Line((30.6625476193, -3.1435972077), (27.3135688072, -3.1389422508))
        make_face()
        with BuildLine():
            ThreePointArc((20.9630926527, -3.1301153236), (22.6358617756, -4.7214826971), (24.3130483101, -3.1347716382))
            Line((24.3130483101, -3.1347716382), (20.9630926527, -3.1301153236))
        make_face()
        with BuildLine():
            Line((17.9635023619, -3.1259460039), (14.6126631372, -3.1212884611))
            ThreePointArc((14.6126631372, -3.1212884611), (16.2858617756, -4.7214826971), (17.9635023619, -3.1259460039))
        make_face()
        with BuildLine():
            Line((11.6139098113, -3.1171203048), (8.2622802241, -3.1124616635))
            ThreePointArc((8.2622802241, -3.1124616635), (9.9358617756, -4.7214826971), (11.6139098113, -3.1171203048))
        make_face()
        with BuildLine():
            Line((5.2643566248, -3.1082946604), (1.911857947, -3.1036348111))
            ThreePointArc((1.911857947, -3.1036348111), (3.5858585328, -4.7238157048), (5.2643566248, -3.1082946604))
        make_face()
        with BuildLine():
            Line((-1.0853413245, -3.0994688148), (-4.4384195675, -3.0948081599))
            ThreePointArc((-4.4384195675, -3.0948081599), (-2.7641414672, -4.7238157048), (-1.0853413245, -3.0994688148))
        make_face()
        with BuildLine():
            Line((-7.4350857828, -3.0906429046), (-10.7886505729, -3.0859815734))
            ThreePointArc((-10.7886505729, -3.0859815734), (-9.1141414672, -4.7238157048), (-7.4350857828, -3.0906429046))
        make_face()
        with BuildLine():
            Line((-13.7848767298, -3.0818169297), (-17.1388350895, -3.0771550515))
            ThreePointArc((-17.1388350895, -3.0771550515), (-15.4641414672, -4.7238157048), (-13.7848767298, -3.0818169297))
        make_face()
        with BuildLine():
            Line((-20.1347141494, -3.0729908903), (-23.4889731336, -3.0683285942))
            ThreePointArc((-23.4889731336, -3.0683285942), (-21.8141414672, -4.7238157048), (-20.1347141494, -3.0729908903))
        make_face()
        with BuildLine():
            Line((-26.4845980289, -3.0641647862), (-29.8390647178, -3.0595022015))
            ThreePointArc((-29.8390647178, -3.0595022015), (-28.1641414672, -4.7238157048), (-26.4845980289, -3.0641647862))
        make_face()
        with BuildLine():
            Line((-32.8345283597, -3.0553386176), (-36.1891098507, -3.0506758733))
            ThreePointArc((-36.1891098507, -3.0506758733), (-34.5141414672, -4.7238157048), (-32.8345283597, -3.0553386176))
        make_face()
        with BuildLine():
            Line((-39.184505137, -3.0465123845), (-42.539108537, -3.0418496097))
            ThreePointArc((-42.539108537, -3.0418496097), (-40.8641414672, -4.7238157048), (-39.184505137, -3.0465123845))
        make_face()
    with SkipClean():  # cleaning this boolean's faces spoils the solid; the shape is the same uncleaned
        extrude(amount=-F4_DEPTH)

    # F2 (on face) → F5 (cut)
    with BuildSketch(Plane.XY.offset(2)):
        with BuildLine():
            ThreePointArc((-42.539108537, 9.6037835574), (-40.6792365975, 14.0939116179), (-36.189108537, 15.9537835574))
            Line((-36.189108537, 15.9537835574), (-44.4982377637, 15.9537835574))
            ThreePointArc((-44.4982377637, 15.9537835574), (-46.6435438514, 15.0651686804), (-47.5321587284, 12.9198625927))
            Line((-47.5321587284, 12.9198625927), (-47.5321587284, 1.9581455603))
            ThreePointArc((-47.5321587284, 1.9581455603), (-46.0701489095, -1.5749303628), (-42.539108537, -3.0418496097))
            Line((-42.539108537, -3.0418496097), (-42.539108537, 9.4149718061))
            Line((-42.539108537, 9.4149718061), (-42.539108537, 9.6037835574))
        make_face()
    extrude(amount=-F5_DEPTH, mode=Mode.SUBTRACT)


solid = f1.part
